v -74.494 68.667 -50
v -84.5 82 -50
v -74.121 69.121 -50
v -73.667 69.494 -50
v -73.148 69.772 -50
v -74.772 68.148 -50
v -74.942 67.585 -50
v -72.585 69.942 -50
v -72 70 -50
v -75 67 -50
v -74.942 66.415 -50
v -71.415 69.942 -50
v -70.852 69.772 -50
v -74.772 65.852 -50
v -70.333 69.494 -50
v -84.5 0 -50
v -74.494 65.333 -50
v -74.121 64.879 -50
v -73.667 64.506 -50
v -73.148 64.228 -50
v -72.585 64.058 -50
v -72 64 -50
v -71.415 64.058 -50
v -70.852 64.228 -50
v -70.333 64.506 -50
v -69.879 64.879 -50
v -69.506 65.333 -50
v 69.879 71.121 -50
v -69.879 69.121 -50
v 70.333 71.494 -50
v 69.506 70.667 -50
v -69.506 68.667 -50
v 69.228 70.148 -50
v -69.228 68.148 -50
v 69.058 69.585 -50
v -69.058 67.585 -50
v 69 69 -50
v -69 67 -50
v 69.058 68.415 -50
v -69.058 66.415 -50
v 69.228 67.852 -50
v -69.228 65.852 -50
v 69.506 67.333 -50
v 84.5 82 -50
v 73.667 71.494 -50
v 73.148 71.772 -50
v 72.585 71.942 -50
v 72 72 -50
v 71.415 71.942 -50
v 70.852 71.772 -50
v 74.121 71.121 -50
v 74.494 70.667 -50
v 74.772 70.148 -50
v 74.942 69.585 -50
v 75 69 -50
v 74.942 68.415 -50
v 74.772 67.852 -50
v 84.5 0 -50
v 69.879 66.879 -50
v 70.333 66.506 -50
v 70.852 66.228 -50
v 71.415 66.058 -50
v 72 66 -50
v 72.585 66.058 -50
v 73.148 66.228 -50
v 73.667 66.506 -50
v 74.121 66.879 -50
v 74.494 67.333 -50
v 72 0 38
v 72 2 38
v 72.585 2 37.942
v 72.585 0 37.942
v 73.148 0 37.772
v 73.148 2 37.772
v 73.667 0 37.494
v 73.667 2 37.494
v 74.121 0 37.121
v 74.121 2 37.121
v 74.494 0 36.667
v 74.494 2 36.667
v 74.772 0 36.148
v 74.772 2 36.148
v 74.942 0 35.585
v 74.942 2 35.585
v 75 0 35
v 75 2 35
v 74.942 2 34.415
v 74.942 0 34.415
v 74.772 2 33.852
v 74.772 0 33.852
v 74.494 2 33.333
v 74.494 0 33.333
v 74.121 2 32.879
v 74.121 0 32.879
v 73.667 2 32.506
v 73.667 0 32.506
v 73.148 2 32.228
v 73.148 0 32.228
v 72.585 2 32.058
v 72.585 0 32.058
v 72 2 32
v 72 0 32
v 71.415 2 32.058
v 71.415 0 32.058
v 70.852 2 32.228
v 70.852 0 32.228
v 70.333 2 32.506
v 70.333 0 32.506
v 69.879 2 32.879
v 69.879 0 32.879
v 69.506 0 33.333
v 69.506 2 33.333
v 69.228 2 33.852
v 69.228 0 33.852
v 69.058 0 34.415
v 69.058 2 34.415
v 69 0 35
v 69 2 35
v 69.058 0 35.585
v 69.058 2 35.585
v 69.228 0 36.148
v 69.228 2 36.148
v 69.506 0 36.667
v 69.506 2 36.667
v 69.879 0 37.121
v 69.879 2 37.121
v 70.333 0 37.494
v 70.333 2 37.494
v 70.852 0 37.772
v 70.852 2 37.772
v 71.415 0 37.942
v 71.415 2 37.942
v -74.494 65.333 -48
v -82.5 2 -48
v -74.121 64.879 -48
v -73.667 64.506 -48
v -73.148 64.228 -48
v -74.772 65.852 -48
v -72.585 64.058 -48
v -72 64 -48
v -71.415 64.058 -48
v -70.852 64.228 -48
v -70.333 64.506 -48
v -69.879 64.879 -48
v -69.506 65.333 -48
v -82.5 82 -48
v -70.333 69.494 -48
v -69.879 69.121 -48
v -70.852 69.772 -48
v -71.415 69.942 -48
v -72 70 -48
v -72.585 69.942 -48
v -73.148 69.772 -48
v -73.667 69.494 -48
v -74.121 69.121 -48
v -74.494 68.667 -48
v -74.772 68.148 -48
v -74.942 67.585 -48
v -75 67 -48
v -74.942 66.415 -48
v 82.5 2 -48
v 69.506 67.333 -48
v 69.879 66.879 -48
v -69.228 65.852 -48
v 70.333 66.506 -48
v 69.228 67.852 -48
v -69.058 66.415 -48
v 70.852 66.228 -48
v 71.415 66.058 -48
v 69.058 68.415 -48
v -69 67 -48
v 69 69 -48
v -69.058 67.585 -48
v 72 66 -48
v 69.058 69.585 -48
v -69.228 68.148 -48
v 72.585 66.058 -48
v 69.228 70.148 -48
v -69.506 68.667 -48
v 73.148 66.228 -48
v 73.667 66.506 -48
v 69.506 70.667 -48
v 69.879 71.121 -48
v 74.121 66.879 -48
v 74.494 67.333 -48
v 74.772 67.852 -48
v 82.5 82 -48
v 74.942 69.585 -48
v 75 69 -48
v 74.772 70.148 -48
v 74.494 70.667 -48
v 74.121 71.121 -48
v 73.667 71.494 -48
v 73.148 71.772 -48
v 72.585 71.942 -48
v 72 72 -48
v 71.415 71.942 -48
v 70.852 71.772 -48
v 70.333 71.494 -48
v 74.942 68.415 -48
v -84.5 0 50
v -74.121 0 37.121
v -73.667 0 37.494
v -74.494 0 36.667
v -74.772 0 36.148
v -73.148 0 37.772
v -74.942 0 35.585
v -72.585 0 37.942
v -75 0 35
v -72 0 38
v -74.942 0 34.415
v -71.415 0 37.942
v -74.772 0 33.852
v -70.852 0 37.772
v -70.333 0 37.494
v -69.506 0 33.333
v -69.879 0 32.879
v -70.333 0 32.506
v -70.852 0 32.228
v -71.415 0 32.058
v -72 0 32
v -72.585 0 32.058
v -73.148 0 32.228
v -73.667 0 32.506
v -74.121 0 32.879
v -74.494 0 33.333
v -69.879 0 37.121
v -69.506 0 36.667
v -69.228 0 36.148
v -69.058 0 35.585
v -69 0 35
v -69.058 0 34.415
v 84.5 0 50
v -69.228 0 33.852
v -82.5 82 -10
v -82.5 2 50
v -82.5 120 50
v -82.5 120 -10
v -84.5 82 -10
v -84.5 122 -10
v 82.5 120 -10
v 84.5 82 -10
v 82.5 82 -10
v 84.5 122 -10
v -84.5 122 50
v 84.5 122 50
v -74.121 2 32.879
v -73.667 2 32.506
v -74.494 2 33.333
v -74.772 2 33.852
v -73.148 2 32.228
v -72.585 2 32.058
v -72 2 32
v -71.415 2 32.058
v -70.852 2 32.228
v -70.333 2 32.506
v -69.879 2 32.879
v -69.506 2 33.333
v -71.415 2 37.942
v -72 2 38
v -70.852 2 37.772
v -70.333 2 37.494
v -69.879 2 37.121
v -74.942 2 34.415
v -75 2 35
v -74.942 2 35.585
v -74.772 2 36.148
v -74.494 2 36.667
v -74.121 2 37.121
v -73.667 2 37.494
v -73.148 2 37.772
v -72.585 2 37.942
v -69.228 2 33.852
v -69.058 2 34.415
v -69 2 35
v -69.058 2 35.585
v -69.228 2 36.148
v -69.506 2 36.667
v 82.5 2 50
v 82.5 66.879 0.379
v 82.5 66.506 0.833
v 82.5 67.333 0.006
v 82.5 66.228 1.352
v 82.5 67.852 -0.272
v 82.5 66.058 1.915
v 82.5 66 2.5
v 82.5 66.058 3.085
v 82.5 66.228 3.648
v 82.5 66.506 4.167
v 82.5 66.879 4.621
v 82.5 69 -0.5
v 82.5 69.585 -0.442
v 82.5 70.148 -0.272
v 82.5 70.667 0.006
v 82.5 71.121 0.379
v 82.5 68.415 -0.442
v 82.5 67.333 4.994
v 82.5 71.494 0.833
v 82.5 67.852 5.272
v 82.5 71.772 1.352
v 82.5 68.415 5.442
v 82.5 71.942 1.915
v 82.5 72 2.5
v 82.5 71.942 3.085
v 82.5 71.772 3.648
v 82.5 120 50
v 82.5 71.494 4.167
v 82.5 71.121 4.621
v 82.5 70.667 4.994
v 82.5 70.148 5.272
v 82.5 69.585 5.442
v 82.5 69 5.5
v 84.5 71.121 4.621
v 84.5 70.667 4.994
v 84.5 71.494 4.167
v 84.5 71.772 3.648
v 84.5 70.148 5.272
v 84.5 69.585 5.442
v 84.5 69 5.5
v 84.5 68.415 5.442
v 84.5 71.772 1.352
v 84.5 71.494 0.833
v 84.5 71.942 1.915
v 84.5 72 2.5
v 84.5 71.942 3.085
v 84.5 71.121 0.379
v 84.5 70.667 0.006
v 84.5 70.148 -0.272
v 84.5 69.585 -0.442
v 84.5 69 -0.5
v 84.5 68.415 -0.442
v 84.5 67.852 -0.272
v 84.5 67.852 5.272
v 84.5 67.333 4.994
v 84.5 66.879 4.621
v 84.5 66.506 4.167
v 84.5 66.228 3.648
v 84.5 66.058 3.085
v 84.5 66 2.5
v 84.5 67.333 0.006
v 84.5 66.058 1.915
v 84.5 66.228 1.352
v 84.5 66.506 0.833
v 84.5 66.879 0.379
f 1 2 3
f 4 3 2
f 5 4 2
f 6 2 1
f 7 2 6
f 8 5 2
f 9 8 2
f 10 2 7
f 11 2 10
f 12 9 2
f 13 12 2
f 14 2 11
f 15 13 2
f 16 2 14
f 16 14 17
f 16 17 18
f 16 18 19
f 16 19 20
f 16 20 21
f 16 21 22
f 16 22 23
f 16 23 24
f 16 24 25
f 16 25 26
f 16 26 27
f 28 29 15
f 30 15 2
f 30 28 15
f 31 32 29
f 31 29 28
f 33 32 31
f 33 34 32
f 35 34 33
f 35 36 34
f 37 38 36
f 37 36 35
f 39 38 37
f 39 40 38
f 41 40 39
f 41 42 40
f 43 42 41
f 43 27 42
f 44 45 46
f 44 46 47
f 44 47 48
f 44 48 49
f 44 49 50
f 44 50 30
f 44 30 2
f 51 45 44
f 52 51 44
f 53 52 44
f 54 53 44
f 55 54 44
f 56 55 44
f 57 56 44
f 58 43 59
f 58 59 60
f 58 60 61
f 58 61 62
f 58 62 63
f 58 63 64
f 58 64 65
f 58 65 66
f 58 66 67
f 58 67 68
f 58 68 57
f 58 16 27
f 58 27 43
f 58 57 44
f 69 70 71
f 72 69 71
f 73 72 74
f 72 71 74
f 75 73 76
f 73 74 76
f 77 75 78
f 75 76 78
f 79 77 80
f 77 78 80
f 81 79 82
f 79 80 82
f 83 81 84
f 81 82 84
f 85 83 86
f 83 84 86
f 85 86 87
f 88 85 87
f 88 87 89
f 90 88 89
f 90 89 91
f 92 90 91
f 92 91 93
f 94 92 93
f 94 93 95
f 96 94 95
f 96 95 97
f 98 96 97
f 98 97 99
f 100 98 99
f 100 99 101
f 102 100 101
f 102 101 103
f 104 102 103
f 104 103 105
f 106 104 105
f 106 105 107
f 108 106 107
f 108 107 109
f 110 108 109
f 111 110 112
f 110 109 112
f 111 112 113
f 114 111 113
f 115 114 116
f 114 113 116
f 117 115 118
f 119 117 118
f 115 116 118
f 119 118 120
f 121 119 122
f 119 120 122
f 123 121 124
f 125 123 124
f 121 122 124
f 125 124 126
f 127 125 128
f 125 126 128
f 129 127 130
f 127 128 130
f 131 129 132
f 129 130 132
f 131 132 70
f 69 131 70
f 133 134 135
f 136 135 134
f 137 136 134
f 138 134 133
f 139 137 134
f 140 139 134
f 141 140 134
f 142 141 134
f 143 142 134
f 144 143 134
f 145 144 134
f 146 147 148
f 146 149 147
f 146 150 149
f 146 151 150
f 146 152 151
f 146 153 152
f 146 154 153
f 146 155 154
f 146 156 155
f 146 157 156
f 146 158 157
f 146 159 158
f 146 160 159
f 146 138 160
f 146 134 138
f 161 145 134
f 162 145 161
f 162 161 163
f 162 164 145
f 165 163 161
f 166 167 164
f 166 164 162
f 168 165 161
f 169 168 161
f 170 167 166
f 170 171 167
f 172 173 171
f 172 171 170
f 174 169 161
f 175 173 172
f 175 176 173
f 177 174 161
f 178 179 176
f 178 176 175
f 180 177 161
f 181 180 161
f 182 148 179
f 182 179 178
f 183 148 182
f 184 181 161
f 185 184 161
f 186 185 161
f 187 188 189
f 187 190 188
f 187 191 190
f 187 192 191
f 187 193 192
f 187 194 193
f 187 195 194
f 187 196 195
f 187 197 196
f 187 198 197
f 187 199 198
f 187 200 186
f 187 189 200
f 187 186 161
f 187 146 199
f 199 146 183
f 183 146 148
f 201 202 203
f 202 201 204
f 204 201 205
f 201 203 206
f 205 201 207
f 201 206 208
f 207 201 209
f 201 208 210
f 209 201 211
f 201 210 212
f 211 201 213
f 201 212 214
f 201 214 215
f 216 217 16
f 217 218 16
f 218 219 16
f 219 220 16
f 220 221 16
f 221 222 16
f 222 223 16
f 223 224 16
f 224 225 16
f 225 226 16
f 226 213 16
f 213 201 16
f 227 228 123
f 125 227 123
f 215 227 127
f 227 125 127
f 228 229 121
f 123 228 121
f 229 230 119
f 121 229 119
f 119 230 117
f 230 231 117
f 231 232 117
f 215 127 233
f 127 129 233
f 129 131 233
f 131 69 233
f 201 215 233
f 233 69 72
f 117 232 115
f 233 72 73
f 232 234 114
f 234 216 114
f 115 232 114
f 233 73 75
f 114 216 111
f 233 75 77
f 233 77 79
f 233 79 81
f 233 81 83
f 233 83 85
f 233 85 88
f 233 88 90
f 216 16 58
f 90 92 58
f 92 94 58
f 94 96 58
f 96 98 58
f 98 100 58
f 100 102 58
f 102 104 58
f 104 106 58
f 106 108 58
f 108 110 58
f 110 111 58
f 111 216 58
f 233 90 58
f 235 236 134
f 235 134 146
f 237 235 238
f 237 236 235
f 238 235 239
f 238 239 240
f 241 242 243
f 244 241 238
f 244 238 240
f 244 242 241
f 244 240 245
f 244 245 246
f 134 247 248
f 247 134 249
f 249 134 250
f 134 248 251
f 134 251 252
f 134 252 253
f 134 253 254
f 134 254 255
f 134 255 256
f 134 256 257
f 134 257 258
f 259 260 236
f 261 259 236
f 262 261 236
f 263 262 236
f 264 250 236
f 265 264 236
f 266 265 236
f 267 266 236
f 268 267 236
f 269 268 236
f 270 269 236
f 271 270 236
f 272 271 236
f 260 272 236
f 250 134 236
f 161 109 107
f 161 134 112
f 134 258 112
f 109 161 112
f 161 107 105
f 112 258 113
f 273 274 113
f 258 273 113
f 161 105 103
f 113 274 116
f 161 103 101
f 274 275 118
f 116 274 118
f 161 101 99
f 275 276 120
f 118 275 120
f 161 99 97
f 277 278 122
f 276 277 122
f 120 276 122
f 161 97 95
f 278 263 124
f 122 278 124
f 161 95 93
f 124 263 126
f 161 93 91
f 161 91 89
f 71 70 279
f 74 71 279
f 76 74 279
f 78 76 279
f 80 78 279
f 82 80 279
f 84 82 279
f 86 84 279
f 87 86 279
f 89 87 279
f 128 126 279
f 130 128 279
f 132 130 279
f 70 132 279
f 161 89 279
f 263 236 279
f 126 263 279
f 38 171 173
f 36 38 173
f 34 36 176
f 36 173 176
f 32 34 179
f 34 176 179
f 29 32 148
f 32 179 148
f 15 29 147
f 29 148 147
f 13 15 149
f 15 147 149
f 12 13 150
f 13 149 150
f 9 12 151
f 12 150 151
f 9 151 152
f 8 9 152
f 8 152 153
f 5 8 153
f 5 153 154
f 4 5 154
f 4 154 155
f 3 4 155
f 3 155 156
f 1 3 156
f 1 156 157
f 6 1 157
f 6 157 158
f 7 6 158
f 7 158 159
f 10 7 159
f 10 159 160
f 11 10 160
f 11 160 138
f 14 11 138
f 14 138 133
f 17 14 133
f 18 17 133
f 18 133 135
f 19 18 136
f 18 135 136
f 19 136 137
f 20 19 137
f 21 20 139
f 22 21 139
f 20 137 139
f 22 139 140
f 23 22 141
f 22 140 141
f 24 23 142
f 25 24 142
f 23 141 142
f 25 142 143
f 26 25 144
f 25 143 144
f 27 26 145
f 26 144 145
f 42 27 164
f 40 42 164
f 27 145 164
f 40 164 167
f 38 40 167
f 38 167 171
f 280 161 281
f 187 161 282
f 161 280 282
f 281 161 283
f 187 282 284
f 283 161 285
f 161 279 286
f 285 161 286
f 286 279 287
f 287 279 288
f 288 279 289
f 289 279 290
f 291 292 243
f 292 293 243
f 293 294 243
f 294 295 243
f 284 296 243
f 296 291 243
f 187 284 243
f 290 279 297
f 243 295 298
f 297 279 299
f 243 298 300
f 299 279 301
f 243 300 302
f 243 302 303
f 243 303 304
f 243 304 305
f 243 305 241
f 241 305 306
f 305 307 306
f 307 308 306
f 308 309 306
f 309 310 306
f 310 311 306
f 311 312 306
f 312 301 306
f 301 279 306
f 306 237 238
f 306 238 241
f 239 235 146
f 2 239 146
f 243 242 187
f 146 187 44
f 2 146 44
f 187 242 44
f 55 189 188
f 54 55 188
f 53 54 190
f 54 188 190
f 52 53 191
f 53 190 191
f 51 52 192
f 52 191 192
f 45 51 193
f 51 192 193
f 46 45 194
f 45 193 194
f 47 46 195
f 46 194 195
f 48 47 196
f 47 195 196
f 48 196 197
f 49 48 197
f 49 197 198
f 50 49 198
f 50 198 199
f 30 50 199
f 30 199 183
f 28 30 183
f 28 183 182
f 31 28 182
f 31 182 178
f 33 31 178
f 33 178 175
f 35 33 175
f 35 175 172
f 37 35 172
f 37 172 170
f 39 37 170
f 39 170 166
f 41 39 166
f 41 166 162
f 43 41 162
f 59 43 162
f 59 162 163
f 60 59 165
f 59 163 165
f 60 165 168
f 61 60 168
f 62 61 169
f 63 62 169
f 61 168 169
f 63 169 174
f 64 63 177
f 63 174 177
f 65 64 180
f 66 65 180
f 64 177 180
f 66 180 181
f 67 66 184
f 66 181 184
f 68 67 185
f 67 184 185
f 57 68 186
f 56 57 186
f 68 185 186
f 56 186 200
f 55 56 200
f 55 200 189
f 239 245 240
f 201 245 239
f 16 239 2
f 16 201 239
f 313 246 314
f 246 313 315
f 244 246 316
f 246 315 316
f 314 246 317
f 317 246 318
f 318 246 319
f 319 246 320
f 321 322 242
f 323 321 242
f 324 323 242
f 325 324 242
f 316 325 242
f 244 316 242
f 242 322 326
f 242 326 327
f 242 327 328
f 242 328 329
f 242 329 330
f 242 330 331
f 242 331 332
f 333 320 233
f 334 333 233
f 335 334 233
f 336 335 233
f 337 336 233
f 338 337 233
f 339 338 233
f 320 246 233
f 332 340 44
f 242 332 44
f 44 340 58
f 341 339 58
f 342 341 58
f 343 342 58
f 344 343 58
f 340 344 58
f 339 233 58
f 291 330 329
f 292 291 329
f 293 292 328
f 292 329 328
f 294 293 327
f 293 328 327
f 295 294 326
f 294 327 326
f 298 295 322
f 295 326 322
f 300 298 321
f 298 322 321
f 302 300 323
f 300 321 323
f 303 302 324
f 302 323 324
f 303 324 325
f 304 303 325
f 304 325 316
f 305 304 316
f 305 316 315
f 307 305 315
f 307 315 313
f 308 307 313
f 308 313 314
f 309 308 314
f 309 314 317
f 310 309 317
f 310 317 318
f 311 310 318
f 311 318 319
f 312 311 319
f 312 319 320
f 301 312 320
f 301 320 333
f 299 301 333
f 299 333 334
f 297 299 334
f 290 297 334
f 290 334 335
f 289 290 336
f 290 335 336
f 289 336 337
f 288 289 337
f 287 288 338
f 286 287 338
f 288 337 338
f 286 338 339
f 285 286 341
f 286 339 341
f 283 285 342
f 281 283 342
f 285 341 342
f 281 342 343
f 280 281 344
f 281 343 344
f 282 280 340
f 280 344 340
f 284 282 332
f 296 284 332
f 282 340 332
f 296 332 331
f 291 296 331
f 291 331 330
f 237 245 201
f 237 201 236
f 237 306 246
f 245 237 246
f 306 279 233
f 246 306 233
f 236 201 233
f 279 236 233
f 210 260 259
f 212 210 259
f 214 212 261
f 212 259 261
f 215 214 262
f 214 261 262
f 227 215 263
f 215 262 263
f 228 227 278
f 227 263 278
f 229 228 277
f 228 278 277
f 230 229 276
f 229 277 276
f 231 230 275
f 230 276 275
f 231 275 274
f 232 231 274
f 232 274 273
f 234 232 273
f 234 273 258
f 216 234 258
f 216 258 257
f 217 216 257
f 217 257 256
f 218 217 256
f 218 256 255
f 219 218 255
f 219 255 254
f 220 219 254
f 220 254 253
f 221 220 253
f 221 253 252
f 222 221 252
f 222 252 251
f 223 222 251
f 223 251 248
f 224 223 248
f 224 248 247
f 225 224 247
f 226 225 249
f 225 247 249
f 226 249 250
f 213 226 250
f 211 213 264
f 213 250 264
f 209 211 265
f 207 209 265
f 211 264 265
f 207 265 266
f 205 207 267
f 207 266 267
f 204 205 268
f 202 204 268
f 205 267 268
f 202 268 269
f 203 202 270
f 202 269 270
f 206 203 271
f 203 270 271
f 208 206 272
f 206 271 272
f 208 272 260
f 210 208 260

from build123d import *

# Parameters (mm, degrees)
SKETCH_2_W          = 169
SKETCH_2_H          = 100
EXTRUDE_2_DEPTH     = 122
SKETCH_6_W          = 165
SKETCH_6_H          = 118
CUT_EXTRUDE_3_DEPTH = 98
SKETCH_7_W          = 40
SKETCH_7_H          = 40
CUT_EXTRUDE_4_DEPTH = 215.347848135
SKETCH_8_R          = 3
CUT_EXTRUDE_5_DEPTH = 10
SKETCH_9_R          = 3
CUT_EXTRUDE_6_DEPTH = 10
SKETCH_10_R         = 3
CUT_EXTRUDE_7_DEPTH = 10


with BuildPart() as part:
    # ｽｹｯﾁ2 → ﾎﾞｽ - 押し出し2 (new body)
    with BuildSketch(Plane(origin=(0, 0, 0), x_dir=(1, 0, 0), z_dir=(0, 1, 0))):
        Rectangle(SKETCH_2_W, SKETCH_2_H)
    extrude(amount=EXTRUDE_2_DEPTH)

    # ｽｹｯﾁ6 → ｶｯﾄ - 押し出し3 (cut)
    with BuildSketch(Plane.XY.offset(50)):
        with Locations((0, 61)):
            Rectangle(SKETCH_6_W, SKETCH_6_H)
    extrude(amount=-CUT_EXTRUDE_3_DEPTH, mode=Mode.SUBTRACT)

    # ｽｹｯﾁ7 → ｶｯﾄ - 押し出し4 (cut, through all)
    with BuildSketch(Plane(origin=(84.5, 0, 0), x_dir=(0, 0, -1), z_dir=(1, 0, 0))):
        with Locations((30, 102)):
            Rectangle(SKETCH_7_W, SKETCH_7_H)
    extrude(amount=-CUT_EXTRUDE_4_DEPTH, mode=Mode.SUBTRACT)

    # ｽｹｯﾁ8 → ｶｯﾄ - 押し出し5 (cut)
    with BuildSketch(Plane(origin=(0, 2, 0), x_dir=(1, 0, 0), z_dir=(0, 1, 0))):
        with Locations(Location((-72, -35, 0), (0, 0, 270))):
            Circle(SKETCH_8_R)
        with Locations(Location((72, -35, 0), (0, 0, 270))):
            Circle(SKETCH_8_R)
    extrude(amount=-CUT_EXTRUDE_5_DEPTH, mode=Mode.SUBTRACT)

    # ｽｹｯﾁ9 → ｶｯﾄ - 押し出し6 (cut)
    with BuildSketch(Plane.XY.offset(-48)):
        with Locations((-72, 67)):
            Circle(SKETCH_9_R)
        with Locations((72, 69)):
            Circle(SKETCH_9_R)
    extrude(amount=-CUT_EXTRUDE_6_DEPTH, mode=Mode.SUBTRACT)

    # ｽｹｯﾁ10 → ｶｯﾄ - 押し出し7 (cut)
    with BuildSketch(Plane(origin=(84.5, 0, 0), x_dir=(0, 0, -1), z_dir=(1, 0, 0))):
        with Locations((-2.5, 69)):
            Circle(SKETCH_10_R)
    extrude(amount=-CUT_EXTRUDE_7_DEPTH, mode=Mode.SUBTRACT)


solid = part.part
